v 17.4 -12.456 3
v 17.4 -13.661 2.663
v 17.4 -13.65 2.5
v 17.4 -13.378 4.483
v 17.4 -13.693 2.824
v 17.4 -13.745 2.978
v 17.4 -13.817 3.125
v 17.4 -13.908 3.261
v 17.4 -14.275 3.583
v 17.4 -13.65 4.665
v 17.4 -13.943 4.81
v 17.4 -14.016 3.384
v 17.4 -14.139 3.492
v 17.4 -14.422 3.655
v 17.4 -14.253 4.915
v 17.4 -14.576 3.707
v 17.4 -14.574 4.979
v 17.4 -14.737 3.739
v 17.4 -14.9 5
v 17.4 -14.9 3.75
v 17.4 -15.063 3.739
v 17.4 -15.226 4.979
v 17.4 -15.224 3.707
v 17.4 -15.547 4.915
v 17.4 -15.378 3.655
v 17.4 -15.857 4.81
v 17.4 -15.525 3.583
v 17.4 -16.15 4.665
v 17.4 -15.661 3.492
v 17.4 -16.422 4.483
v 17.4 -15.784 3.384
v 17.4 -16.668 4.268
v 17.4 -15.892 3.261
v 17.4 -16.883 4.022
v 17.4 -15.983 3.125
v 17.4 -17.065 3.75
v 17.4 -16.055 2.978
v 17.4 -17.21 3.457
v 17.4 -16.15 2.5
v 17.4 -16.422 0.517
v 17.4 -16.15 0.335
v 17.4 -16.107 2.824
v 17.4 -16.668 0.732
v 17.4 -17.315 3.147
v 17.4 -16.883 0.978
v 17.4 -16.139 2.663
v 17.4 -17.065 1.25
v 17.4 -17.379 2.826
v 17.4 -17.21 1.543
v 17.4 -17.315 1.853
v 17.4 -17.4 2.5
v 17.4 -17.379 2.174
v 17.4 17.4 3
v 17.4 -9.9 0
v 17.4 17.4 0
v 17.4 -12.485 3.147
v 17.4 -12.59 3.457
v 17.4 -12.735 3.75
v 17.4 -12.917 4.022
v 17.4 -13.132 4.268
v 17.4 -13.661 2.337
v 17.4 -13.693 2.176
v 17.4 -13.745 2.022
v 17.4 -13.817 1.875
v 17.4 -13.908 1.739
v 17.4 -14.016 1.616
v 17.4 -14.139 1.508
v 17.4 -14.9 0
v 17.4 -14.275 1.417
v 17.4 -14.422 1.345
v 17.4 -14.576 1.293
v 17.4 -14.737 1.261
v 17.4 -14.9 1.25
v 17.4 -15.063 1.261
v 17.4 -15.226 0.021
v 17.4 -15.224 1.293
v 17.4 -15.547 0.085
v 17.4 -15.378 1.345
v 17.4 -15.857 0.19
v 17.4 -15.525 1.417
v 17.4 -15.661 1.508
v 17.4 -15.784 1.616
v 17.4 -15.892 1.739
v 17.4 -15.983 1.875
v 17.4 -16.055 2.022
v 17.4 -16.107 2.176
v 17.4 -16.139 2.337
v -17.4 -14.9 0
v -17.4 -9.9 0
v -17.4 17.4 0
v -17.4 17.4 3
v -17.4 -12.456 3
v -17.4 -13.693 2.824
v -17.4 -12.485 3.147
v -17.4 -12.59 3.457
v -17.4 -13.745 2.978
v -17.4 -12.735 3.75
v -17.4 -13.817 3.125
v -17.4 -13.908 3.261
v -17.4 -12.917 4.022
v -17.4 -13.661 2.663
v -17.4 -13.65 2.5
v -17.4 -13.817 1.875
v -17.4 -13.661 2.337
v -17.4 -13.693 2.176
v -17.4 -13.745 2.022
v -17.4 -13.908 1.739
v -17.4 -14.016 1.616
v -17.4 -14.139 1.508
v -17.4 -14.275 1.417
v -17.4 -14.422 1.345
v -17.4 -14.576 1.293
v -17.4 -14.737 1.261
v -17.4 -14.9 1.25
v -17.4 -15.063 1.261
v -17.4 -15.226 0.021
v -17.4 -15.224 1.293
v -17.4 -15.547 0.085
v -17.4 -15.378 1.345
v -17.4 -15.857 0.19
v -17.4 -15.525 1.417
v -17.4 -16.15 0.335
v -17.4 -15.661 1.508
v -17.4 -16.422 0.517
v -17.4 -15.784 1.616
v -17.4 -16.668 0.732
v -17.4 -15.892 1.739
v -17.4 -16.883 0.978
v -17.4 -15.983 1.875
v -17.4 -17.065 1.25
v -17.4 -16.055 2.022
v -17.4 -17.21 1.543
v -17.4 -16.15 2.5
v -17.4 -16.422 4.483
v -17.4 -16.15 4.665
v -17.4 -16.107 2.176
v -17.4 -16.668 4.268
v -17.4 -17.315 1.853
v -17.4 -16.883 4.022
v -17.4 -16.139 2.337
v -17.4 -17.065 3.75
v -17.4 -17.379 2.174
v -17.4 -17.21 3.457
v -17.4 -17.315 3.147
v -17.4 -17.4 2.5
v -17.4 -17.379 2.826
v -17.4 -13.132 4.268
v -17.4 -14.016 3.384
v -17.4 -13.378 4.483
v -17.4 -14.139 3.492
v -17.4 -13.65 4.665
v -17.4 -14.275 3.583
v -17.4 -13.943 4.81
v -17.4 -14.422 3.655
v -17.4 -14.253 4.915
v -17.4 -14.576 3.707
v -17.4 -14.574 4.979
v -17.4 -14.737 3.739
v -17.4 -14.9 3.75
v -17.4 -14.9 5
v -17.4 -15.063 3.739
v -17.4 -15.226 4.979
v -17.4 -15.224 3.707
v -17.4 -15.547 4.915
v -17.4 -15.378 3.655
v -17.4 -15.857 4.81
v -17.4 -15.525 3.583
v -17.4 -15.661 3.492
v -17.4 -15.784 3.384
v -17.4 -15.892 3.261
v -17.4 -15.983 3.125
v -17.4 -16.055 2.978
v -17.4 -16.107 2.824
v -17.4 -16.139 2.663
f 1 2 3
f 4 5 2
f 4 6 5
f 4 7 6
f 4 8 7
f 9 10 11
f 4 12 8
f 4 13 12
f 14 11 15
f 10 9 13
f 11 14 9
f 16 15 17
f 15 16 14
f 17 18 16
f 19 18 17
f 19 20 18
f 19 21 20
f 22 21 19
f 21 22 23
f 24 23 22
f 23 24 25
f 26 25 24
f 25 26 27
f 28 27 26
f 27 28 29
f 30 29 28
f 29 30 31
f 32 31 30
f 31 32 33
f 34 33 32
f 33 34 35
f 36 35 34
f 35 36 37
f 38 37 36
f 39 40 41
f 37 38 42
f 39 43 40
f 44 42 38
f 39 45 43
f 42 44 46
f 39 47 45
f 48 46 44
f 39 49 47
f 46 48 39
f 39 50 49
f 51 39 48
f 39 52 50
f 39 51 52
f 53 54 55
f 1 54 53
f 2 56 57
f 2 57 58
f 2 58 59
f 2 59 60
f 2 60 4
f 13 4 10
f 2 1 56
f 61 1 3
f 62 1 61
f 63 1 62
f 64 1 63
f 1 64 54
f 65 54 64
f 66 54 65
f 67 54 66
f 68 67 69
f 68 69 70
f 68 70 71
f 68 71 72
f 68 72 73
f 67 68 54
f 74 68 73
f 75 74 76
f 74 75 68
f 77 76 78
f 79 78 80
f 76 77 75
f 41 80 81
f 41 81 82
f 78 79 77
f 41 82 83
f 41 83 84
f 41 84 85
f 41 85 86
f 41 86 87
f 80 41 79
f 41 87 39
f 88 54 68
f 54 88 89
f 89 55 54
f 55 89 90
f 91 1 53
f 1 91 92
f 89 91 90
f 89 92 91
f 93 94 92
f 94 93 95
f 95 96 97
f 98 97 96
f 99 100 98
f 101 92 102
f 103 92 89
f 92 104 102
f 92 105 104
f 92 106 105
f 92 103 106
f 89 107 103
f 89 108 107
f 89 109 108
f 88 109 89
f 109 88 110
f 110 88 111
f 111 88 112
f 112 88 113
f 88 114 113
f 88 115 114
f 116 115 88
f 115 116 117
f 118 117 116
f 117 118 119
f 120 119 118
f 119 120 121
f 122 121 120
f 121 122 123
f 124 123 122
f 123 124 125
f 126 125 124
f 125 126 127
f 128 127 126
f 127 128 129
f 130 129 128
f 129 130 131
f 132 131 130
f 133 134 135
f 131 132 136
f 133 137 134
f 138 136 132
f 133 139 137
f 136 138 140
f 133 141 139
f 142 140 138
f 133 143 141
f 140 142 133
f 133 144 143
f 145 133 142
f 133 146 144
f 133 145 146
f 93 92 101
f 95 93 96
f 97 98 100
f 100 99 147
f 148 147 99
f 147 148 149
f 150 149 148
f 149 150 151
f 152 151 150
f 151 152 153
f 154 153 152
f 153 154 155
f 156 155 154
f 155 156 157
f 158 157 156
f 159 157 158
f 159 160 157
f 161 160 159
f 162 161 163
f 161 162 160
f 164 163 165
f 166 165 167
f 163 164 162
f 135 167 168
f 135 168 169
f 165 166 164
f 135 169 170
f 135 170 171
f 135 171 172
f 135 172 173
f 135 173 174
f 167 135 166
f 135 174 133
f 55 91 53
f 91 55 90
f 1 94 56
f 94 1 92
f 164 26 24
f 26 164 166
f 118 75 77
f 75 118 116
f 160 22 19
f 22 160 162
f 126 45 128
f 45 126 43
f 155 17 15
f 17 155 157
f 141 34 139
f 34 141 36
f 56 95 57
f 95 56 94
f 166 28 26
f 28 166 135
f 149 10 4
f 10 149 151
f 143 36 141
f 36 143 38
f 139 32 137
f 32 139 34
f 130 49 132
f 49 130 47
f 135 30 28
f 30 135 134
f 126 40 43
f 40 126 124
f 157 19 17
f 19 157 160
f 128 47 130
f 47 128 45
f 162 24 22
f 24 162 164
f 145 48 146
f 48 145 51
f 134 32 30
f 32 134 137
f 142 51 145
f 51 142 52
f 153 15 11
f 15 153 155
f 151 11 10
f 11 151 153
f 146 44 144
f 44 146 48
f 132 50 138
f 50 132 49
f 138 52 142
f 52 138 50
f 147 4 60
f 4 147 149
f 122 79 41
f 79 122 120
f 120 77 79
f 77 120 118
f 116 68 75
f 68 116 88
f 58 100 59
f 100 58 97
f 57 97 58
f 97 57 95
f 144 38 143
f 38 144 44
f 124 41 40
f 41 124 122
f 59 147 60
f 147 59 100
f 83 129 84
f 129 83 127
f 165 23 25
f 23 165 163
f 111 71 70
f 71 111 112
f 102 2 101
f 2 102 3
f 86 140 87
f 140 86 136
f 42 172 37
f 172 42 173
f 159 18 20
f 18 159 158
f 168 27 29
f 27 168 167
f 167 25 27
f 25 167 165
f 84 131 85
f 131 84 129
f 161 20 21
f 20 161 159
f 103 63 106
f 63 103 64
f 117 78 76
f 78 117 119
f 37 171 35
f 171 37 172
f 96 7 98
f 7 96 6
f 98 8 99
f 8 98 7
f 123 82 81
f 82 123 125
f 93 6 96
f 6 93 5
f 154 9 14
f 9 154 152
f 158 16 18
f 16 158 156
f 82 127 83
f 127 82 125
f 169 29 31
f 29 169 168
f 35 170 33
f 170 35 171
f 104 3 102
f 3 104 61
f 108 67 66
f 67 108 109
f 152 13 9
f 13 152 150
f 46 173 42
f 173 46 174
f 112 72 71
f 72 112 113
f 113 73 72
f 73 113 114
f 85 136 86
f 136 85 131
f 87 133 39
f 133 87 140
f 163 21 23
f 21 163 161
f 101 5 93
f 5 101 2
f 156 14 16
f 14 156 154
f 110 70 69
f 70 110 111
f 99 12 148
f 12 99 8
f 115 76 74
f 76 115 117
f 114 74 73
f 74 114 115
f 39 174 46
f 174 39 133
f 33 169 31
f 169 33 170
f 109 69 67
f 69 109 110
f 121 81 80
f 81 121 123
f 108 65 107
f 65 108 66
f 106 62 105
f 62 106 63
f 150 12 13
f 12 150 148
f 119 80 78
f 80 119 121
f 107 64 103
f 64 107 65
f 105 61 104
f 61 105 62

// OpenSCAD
// file: measurements.scad
// Measurements of YOUR table, shared by every printed part, in millimetres.
//
// These are placeholders until the real table is measured with calipers. Edit
// the numbers here (nothing else in this file), save, then open a part and
// export it. See docs/3d-printing.md.

// --- The playfield ----------------------------------------------------------

// Thickness of the playfield at the trapdoor holes.
playfield_thickness = 12.7;

// --- Each trapdoor hole ------------------------------------------------------
// "Width" runs across the table (left to right); "length" runs up the table.

// Width of the hole.
hole_width = 40;

// Length of the hole.
hole_length = 40;

// --- Screws -----------------------------------------------------------------

// Wood screws into the underside of the playfield. They must be SHORTER than
// the playfield is thick, or they'll come out through the artwork. 3.5 mm x
// 9.5 mm (No. 6 x 3/8") suits a 12.7 mm playfield.
wood_screw_diameter = 3.5;

// Steel rod used as each flap's hinge pin.
hinge_pin_diameter = 2;

// --- Printing ---------------------------------------------------------------

// Gap left between parts that fit together, for a typical printer. Make it
// bigger if parts are too tight, smaller if they're loose.
fit_clearance = 0.4;
// file: common.scad
// Shared helpers for the printed parts. Nothing to change here: table sizes
// are in measurements.scad, and each part's options are in its own file.

include <measurements.scad>

// A real pinball: 1 1/16 inch.
ball_diameter = 27;

// Smooth enough curves for printing.
$fn = 48;

// A countersunk hole for a wood screw going up into the playfield, through a
// plate `thickness` thick lying on z = 0 (its top face is the side that
// presses against the playfield).
module wood_screw_hole(thickness) {
    head = wood_screw_diameter * 2;
    translate([0, 0, -0.01]) {
        cylinder(d = wood_screw_diameter + 0.3, h = thickness + 0.02);
        // The head sits in the face away from the playfield.
        cylinder(d1 = head, d2 = wood_screw_diameter + 0.3, h = (head - wood_screw_diameter) / 2);
    }
}

// --- Trapdoor geometry, shared so the frame, flap, lifter and chute fit -----
//
// Coordinates: the origin is the centre of the hole on the playfield's
// underside. x runs across the table (left to right), y up the table (towards
// the back), z up. The playfield's top surface is at z = playfield_thickness.

// The frame's sleeve slides up into the hole.
frame_wall = 2;
outer_width = hole_width - fit_clearance;
outer_length = hole_length - fit_clearance;
inner_width = outer_width - 2 * frame_wall;
inner_length = outer_length - 2 * frame_wall;
// The flange under the playfield.
flange_width = 10;
flange_thickness = 4;

// The flap: a plate that sits flush in the top of the frame, pivoting on the
// hinge pin along its uphill (back) edge.
flap_thickness = 3;
knuckle_radius = 2.5;
pin_y = inner_length / 2 - knuckle_radius - fit_clearance;
pin_z = playfield_thickness - knuckle_radius;
flap_width = inner_width - 2 * fit_clearance;
flap_front = -inner_length / 2 + fit_clearance;

// The servo (an MG90S) hangs under the flange on the right, its shaft pointing
// left into the frame, and turns the lifter arm that the flap rests on.
servo_body = [22.8, 12.2, 22.5];  // long, wide, top face to base
servo_shaft_from_end = 5.9;       // shaft centre from the near end of the body
servo_tab_from_top = 6.5;         // mounting tabs below the shaft's face
servo_tab_spacing = 27.8;
servo_tab_hole = 1.8;             // for the screws that come with the servo
// Where the lifter arm swings: just inside the frame's right wall.
lifter_thickness = 3;
lifter_x = inner_width / 2 - 1 - lifter_thickness;
servo_top_x = lifter_x + lifter_thickness + 3;  // the horn sits ~3 mm out
servo_shaft_y = flap_front + 9;                 // under the flap's front edge
servo_shaft_z = -flange_thickness - servo_body[1] / 2 - 1;
// The lifter reaches from the shaft up to the underside of the closed flap.
lifter_length = playfield_thickness - flap_thickness - servo_shaft_z;

// The chute catches the ball beside the lifter and servo: from the frame's left
// wall to just short of the lifter arm.
chute_wall = 2.5;
chute_right = lifter_x - 1 - chute_wall;
chute_opening = chute_right + inner_width / 2;
// Pilot holes in the frame's flange for the chute's two screws (M3 x 6 mm
// self-tapping): one on the left, one at the front.
chute_screws = [
    [-(outer_width / 2 + flange_width / 2), 0],
    [(chute_right - inner_width / 2) / 2, -(outer_length / 2 + flange_width / 2)],
];
assert(chute_opening >= ball_diameter + 1,
    "The hole is too narrow for the ball to fall past the lifter arm: check hole_width in measurements.scad.");
// main file
// Trapdoor flap: one per trapdoor. A plate that sits flush in the top of the
// frame, pivoting on the hinge pin along its back (uphill) edge. It rests on
// the servo's lifter arm: up holds it closed, down lets it swing open.
//
// Print it upside down (top face on the bed) for a smooth top, no supports.
// Paint it, or glue a print of the artwork on top.

include <common.scad>

// Flipped so the top face is on the bed.
translate([0, 0, playfield_thickness]) rotate([180, 0, 0]) flap();

module flap() {
    difference() {
        union() {
            translate([-flap_width / 2, flap_front, playfield_thickness - flap_thickness])
                cube([flap_width, pin_y - flap_front, flap_thickness]);
            // The knuckle around the hinge pin.
            translate([0, pin_y, pin_z])
                rotate([0, 90, 0])
                    cylinder(r = knuckle_radius, h = flap_width, center = true);
        }
        // A free fit on the pin.
        translate([0, pin_y, pin_z])
            rotate([0, 90, 0])
                cylinder(d = hinge_pin_diameter + 0.5, h = flap_width + 2, center = true);
        // Keep the top flat where the knuckle would poke above it.
        translate([-flap_width, pin_y - 5, playfield_thickness])
            cube([2 * flap_width, 10, 5]);
    }
}
